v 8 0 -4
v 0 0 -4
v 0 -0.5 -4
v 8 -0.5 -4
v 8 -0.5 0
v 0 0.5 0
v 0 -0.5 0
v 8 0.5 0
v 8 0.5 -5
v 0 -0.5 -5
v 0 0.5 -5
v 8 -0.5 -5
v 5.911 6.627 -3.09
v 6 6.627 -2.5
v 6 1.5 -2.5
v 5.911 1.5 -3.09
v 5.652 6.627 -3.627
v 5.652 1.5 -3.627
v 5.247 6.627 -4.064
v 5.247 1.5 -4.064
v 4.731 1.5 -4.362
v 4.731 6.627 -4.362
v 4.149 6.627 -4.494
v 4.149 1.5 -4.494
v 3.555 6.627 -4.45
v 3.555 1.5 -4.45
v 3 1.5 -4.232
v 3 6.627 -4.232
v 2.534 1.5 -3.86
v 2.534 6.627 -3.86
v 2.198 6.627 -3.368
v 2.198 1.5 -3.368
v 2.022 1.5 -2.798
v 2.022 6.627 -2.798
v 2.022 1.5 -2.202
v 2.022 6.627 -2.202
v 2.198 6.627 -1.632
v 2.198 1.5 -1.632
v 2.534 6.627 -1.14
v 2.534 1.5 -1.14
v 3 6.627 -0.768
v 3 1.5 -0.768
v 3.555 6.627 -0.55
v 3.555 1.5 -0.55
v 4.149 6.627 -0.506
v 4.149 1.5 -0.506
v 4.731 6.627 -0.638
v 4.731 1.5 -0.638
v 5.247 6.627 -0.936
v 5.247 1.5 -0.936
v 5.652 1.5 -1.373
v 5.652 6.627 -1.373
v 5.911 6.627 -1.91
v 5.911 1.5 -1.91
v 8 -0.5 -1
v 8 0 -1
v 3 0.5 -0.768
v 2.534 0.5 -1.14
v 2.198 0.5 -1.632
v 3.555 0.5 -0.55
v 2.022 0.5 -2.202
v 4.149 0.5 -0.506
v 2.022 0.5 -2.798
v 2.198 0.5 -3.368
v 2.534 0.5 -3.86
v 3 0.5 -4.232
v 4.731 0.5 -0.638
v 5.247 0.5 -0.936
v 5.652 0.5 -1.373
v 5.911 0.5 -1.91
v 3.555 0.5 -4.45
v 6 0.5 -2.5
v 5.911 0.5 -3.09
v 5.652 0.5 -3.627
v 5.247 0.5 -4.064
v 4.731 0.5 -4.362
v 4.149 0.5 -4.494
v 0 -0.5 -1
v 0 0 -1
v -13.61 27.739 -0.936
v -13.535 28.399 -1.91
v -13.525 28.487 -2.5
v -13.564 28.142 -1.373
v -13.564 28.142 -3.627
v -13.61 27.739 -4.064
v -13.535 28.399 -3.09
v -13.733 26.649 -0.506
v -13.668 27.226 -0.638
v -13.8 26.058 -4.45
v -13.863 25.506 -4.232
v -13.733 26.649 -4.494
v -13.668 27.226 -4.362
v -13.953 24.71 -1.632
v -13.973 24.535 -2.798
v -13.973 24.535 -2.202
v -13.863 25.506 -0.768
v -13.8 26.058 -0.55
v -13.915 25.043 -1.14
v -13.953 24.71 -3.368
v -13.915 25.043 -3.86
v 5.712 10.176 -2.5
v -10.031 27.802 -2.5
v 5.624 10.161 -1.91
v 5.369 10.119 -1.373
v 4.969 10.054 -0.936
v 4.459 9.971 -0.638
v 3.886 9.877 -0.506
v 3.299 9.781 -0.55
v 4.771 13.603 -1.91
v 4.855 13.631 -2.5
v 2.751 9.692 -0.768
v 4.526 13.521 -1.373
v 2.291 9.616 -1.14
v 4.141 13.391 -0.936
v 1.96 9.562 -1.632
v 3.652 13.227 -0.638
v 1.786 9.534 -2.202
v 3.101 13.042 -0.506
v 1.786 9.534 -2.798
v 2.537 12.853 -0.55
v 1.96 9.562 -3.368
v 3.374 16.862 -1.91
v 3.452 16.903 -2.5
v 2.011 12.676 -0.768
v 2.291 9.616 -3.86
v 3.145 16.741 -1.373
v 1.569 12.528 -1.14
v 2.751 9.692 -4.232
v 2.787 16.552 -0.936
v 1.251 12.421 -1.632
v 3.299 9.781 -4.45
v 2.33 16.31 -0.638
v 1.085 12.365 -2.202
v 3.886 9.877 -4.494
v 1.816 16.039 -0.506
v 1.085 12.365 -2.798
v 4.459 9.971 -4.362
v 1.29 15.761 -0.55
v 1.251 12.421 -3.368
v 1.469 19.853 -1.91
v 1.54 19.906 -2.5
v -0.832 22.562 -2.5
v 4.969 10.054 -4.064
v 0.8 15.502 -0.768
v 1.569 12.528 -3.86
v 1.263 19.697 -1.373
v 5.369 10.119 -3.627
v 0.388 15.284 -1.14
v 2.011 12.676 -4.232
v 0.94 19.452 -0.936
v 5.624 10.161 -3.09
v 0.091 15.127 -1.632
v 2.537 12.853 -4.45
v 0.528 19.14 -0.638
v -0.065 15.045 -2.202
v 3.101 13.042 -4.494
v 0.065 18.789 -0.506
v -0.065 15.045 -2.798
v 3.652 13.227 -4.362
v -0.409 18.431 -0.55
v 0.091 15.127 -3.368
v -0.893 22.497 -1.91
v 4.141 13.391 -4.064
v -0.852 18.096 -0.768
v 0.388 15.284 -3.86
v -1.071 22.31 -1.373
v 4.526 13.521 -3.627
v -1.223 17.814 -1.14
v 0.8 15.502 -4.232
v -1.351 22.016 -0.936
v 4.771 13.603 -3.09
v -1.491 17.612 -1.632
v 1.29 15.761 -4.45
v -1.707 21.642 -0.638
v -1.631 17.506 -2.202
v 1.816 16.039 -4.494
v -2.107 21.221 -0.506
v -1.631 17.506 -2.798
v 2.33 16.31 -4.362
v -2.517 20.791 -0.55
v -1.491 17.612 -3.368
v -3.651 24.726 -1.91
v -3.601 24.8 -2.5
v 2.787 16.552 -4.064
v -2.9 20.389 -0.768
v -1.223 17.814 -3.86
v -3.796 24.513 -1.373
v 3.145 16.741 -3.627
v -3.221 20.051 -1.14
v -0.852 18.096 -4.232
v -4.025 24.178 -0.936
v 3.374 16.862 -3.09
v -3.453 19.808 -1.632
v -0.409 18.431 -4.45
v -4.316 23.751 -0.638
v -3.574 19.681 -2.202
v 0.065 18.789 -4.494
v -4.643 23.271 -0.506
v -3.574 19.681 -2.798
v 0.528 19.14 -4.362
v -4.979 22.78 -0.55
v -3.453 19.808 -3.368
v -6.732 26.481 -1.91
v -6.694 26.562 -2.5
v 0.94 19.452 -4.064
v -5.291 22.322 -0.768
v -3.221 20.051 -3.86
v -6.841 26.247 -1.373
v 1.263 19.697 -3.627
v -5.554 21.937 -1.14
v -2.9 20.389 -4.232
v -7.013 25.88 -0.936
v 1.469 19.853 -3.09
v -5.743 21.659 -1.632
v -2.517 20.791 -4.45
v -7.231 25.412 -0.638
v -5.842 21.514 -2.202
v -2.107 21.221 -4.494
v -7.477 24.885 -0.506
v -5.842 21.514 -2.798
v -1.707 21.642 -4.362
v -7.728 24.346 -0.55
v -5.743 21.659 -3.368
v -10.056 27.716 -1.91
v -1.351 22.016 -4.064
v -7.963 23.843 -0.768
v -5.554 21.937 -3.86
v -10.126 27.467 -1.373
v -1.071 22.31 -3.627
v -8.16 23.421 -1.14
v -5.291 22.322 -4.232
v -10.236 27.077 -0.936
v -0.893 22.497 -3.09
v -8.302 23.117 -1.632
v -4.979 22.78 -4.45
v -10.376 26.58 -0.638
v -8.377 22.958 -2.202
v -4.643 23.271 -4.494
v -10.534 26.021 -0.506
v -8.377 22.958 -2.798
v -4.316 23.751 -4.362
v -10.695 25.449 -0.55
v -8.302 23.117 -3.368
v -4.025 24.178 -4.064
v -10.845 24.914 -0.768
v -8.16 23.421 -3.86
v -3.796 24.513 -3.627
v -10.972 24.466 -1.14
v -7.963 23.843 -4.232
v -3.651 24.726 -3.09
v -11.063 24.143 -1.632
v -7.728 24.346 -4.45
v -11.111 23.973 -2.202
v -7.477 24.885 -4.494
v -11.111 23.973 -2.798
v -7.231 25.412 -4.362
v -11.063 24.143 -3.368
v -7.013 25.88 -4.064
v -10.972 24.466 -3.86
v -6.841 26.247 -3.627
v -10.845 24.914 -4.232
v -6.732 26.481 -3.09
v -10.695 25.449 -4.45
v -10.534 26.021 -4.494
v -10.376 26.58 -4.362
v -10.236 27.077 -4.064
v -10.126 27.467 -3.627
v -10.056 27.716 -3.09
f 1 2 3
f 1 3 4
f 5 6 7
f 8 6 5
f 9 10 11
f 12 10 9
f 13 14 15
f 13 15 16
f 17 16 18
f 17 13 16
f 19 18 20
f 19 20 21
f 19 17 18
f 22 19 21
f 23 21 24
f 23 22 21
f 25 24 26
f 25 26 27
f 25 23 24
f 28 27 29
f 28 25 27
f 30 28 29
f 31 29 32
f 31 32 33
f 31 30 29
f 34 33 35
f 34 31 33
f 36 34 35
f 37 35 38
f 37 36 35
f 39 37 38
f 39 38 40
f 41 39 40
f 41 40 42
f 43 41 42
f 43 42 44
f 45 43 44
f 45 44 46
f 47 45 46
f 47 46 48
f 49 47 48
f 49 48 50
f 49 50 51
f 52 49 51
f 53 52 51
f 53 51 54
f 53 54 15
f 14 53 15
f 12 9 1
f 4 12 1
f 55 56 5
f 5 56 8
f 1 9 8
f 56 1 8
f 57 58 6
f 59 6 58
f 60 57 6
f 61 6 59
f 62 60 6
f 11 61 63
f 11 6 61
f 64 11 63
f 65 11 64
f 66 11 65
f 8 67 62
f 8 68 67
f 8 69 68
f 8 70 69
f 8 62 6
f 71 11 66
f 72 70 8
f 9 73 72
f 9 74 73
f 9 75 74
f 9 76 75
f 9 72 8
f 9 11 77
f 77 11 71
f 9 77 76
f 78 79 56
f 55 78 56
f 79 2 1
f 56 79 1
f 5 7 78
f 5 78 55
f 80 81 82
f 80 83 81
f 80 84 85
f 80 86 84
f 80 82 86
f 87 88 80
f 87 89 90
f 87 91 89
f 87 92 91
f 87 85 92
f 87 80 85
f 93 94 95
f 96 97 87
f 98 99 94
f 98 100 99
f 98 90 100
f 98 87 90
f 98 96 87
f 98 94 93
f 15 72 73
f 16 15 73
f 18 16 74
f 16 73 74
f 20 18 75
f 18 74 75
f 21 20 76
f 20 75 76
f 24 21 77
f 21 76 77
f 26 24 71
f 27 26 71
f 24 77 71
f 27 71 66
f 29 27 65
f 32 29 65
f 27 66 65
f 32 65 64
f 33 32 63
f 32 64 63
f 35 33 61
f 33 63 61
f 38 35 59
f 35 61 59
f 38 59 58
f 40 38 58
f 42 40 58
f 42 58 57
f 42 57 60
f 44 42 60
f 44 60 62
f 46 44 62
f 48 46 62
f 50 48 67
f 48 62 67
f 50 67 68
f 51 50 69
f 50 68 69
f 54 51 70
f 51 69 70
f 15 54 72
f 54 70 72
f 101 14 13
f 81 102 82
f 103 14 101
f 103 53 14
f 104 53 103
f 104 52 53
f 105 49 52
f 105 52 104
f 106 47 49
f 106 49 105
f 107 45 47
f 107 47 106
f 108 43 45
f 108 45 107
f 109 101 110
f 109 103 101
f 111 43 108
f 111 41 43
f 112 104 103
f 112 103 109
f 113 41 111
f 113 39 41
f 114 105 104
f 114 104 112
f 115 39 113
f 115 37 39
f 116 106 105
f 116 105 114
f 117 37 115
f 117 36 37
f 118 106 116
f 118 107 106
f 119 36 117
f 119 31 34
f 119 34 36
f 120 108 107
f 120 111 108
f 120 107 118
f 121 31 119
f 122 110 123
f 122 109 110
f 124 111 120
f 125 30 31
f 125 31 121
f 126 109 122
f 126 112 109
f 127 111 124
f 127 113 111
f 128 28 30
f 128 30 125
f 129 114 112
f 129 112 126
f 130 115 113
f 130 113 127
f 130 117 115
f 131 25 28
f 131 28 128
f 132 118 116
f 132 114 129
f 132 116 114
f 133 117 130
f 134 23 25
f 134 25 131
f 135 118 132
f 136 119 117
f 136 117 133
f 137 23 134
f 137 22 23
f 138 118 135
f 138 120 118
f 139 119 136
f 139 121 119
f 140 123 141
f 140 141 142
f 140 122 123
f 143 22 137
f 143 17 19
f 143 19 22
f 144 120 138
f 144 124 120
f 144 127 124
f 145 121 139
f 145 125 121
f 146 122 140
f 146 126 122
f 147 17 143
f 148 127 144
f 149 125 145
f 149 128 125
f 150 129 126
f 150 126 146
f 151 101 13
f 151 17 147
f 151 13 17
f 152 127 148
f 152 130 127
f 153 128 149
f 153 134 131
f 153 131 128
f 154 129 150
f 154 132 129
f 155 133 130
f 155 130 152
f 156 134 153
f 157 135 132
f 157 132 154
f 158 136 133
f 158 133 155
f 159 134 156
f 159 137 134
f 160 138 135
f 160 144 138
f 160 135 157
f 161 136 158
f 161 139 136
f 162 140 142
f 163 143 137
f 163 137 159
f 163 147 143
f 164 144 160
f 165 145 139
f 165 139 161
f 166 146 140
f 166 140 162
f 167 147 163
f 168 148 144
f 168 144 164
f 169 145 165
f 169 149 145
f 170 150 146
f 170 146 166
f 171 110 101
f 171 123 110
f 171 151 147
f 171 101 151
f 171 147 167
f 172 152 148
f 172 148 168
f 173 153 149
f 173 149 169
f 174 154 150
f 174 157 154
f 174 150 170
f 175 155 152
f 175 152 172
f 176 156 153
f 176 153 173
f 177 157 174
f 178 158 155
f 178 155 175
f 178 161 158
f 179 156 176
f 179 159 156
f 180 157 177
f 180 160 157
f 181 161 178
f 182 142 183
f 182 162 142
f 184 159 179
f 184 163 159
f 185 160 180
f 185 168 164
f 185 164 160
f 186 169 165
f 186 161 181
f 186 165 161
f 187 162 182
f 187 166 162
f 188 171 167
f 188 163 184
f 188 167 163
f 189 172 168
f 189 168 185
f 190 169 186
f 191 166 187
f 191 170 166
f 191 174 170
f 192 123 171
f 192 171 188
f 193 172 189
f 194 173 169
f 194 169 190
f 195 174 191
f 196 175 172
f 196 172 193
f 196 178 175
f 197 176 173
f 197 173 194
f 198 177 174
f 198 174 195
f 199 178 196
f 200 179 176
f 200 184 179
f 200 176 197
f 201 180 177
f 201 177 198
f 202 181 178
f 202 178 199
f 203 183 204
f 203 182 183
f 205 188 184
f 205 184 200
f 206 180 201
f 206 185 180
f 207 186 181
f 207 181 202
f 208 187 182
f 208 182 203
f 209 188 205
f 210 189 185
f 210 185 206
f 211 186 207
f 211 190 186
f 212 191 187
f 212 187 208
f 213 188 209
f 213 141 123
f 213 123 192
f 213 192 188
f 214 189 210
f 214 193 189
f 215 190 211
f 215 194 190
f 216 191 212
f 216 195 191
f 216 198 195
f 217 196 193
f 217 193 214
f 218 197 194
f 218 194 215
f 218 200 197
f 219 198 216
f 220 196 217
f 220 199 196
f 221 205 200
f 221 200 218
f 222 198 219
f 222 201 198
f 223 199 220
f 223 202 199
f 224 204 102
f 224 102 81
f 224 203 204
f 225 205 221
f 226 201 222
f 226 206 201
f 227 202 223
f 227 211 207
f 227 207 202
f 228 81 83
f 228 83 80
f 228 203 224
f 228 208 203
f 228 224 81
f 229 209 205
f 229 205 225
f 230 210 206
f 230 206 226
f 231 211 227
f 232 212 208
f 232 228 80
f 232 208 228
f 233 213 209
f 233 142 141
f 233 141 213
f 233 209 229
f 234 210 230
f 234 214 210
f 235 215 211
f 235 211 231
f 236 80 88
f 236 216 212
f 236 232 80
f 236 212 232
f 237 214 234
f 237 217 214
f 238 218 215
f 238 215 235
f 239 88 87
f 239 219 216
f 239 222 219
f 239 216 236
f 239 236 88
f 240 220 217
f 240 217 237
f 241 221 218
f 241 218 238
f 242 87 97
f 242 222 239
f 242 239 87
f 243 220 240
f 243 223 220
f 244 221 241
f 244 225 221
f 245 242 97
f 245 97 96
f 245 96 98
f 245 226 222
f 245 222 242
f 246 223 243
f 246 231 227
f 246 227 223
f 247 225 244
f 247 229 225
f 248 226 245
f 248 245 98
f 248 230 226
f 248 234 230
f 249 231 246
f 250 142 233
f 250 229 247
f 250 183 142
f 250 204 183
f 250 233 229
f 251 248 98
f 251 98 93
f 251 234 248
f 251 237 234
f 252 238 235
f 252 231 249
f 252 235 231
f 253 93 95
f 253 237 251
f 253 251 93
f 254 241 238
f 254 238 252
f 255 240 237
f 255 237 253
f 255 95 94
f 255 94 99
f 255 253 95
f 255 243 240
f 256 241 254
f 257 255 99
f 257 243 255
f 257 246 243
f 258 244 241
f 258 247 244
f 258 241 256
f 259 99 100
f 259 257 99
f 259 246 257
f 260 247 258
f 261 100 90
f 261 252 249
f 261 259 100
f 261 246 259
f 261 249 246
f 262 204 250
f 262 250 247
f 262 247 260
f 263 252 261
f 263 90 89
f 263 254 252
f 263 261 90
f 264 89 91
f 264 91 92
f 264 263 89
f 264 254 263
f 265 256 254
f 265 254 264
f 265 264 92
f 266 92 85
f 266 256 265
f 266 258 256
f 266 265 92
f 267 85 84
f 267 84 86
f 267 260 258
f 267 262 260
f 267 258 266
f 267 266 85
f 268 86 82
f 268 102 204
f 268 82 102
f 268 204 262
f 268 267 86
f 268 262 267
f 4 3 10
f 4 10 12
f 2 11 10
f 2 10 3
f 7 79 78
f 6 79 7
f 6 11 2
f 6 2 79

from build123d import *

# Parameters (mm, degrees)
SKETCH1_W           = 8
SKETCH1_H           = 5
BOSS_EXTRUDE1_DEPTH = 0.5
SKETCH2_W           = 8
SKETCH2_H           = 1
BOSS_EXTRUDE2_DEPTH = 0.5
SKETCH3_R           = 2
BOSS_EXTRUDE3_DEPTH = 1
SWEEP5_PROFILE_R    = 2


with BuildPart() as part:
    # Sketch1 → Boss-Extrude1 (new body)
    with BuildSketch(Plane(origin=(0, 0, 0), x_dir=(1, 0, 0), z_dir=(0, 1, 0))):
        with Locations((4, 2.5)):
            Rectangle(SKETCH1_W, SKETCH1_H)
    extrude(amount=BOSS_EXTRUDE1_DEPTH)

    # Sketch2 → Boss-Extrude2 (add)
    with BuildSketch(Plane.XZ):
        with Locations((4, -0.5)):
            Rectangle(SKETCH2_W, SKETCH2_H)
        with Locations((4, -4.5)):
            Rectangle(SKETCH2_W, SKETCH2_H)
    extrude(amount=BOSS_EXTRUDE2_DEPTH)

    # Sketch3 → Boss-Extrude3 (add)
    with BuildSketch(Plane(origin=(0, 0.5, 0), x_dir=(1, 0, 0), z_dir=(0, 1, 0))):
        with Locations((4, 2.5)):
            Circle(SKETCH3_R)
    extrude(amount=BOSS_EXTRUDE3_DEPTH)

    # Sweep5: sweep along a path in Sketch6
    with BuildLine(Plane.XY.offset(-2.5)) as sweep5_path:
        Line((4, 1.5), (4, 6.626951227))
        ThreePointArc((4, 6.626951227), (-1.083608385, 19.949911153), (-13.750126119, 26.5))
    # Sweep5 profile (on start of the path) → Sweep5 (sweep)
    with BuildSketch(Plane(origin=(4, 1.5, -2.5), x_dir=(1, 0, 0), z_dir=(0, 1, 0))):
        Circle(SWEEP5_PROFILE_R)
    sweep(path=sweep5_path.line)


solid = part.part
